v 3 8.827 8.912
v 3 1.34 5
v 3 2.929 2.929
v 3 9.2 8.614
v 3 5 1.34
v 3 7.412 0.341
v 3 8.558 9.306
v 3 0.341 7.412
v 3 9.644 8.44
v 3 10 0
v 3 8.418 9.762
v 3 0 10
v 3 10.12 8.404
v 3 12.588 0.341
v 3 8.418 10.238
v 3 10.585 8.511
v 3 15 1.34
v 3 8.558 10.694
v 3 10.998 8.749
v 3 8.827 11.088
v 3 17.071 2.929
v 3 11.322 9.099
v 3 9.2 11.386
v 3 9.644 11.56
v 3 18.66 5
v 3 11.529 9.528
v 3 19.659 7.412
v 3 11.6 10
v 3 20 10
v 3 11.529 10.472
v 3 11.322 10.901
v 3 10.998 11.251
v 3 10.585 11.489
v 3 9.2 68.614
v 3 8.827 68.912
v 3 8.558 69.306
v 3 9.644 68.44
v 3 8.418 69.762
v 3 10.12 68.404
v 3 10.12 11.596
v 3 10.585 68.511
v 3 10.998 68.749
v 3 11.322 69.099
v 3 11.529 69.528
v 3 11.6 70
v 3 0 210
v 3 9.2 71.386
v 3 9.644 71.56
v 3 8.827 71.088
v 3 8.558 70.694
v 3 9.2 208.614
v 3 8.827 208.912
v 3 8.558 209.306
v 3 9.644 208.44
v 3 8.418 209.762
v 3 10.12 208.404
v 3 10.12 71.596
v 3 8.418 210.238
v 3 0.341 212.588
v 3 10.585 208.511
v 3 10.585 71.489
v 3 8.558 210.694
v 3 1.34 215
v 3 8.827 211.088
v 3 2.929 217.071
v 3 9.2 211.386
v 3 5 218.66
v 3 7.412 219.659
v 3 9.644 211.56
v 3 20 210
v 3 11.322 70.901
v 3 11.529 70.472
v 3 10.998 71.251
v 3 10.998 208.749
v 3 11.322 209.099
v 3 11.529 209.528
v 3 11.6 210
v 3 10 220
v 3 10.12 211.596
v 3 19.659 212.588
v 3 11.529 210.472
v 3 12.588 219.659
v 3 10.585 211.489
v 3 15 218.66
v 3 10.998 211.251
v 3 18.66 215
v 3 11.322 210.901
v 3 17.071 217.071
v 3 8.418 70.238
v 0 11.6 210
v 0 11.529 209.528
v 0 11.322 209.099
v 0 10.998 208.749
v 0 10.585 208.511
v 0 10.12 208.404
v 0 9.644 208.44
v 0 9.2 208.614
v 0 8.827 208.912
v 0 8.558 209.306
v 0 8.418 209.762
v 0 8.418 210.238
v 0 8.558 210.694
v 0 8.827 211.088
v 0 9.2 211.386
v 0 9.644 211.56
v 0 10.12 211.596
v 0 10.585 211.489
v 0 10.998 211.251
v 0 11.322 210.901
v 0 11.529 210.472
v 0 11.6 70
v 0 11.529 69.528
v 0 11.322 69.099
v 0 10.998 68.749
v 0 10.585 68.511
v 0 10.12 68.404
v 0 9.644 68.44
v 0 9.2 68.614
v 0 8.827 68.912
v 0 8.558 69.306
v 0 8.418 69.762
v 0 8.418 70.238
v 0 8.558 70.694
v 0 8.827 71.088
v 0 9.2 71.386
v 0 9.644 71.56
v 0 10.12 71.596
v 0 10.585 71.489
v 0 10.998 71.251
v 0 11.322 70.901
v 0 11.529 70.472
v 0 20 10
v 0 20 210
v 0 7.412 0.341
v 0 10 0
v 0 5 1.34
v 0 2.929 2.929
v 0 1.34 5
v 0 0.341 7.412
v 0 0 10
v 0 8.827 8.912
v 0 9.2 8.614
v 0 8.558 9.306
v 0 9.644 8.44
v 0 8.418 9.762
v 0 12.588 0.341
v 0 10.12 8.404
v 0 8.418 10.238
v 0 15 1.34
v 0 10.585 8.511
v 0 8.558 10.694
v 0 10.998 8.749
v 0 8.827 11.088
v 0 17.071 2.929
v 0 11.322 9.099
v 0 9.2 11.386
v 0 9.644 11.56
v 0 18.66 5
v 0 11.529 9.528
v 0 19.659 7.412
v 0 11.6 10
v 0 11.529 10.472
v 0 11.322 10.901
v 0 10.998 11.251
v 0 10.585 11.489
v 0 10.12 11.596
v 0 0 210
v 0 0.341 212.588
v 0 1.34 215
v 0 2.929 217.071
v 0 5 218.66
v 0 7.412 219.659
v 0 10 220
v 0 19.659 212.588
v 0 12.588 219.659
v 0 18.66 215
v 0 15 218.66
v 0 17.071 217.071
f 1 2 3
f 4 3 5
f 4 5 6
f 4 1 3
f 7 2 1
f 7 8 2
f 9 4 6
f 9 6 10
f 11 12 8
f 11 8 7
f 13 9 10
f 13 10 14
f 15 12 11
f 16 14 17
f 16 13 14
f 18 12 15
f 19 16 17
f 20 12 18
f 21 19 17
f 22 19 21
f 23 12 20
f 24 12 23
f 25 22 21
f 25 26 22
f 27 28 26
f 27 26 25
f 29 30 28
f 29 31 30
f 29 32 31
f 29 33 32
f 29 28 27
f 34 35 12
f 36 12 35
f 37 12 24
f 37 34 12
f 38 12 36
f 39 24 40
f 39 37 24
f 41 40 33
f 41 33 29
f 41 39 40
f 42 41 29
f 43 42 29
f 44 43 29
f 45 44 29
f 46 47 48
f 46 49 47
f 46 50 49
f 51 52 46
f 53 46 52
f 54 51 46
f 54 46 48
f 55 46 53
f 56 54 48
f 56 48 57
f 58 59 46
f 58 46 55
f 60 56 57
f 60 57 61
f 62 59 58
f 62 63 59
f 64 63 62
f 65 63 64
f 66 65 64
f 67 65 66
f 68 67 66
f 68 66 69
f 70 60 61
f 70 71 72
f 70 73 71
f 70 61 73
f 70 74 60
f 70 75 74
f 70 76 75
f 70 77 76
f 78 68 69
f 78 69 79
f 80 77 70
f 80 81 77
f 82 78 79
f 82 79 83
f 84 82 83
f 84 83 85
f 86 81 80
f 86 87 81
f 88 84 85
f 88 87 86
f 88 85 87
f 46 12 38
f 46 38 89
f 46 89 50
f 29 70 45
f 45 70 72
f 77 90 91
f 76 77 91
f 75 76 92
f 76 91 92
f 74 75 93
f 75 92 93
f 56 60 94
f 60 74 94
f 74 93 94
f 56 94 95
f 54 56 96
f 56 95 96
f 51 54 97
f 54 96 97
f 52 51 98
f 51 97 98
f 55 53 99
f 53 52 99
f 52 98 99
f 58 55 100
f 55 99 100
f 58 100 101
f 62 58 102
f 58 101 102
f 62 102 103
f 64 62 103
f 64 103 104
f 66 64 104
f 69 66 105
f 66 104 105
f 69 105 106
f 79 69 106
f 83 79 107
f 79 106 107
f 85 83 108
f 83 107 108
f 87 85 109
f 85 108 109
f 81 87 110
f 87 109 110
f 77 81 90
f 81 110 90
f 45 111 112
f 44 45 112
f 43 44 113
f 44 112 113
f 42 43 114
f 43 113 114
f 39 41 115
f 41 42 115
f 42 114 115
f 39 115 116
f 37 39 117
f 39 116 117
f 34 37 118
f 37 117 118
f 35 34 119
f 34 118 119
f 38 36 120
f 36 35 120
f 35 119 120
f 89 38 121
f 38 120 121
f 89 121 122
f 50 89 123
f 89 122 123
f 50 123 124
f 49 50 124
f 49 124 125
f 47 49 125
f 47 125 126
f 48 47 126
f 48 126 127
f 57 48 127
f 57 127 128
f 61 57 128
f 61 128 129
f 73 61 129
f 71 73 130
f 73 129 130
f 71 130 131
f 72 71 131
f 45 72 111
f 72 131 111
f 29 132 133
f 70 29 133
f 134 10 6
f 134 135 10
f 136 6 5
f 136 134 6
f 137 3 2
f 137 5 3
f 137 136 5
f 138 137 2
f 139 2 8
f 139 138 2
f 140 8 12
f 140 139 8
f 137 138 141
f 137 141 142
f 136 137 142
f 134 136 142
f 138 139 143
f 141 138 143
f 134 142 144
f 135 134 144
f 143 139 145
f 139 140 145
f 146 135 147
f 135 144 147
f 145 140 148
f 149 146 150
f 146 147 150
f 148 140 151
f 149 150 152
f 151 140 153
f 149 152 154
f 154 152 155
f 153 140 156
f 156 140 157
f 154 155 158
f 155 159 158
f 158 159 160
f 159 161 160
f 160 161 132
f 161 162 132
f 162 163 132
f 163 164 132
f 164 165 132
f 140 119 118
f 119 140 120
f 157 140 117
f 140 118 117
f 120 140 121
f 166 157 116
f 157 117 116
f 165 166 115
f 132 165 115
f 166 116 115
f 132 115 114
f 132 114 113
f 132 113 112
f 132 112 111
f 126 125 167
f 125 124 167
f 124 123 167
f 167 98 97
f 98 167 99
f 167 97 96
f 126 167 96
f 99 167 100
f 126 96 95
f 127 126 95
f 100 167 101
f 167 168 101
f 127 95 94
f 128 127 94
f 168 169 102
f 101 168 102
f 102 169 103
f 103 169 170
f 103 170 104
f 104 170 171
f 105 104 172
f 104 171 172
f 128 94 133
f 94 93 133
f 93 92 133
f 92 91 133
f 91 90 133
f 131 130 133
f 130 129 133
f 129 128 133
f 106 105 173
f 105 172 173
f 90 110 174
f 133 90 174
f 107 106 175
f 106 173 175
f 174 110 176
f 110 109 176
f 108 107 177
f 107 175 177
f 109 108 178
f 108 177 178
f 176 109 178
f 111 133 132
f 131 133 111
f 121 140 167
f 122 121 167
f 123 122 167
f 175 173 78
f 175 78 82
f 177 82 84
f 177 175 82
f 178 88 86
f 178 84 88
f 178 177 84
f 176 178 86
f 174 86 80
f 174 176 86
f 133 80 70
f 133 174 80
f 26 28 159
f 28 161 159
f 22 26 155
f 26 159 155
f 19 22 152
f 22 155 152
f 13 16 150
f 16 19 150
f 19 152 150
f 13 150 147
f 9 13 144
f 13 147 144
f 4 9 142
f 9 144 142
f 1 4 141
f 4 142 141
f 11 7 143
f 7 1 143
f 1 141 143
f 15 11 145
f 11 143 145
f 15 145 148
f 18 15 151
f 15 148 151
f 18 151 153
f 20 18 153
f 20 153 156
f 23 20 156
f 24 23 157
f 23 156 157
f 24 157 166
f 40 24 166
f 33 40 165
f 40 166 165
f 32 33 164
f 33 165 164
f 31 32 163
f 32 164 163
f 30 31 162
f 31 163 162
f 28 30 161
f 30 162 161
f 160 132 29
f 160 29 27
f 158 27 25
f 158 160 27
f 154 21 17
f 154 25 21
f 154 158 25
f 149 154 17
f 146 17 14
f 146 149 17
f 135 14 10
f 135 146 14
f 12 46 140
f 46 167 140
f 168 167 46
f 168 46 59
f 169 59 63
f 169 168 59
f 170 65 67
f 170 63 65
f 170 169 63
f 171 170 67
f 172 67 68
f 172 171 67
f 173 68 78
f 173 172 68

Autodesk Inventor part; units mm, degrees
ref_plane "YZ Plane" through (0, 0, 0) normal (1, 0, 0) x (0, 1, 0)
ref_plane "XZ Plane" through (0, 0, 0) normal (0, 1, 0) x (-1, 0, 0)
ref_plane "XY Plane" through (0, 0, 0) normal (0, 0, 1) x (1, 0, 0)
sketch "Szkic1" plane through (0, 0, 0) normal (1, 0, 0) x (0, 1, 0)
  line L0 (10, 0) -> (10, 0)
  line L1 (20, 10) -> (20, 210)
  line L2 (10, 220) -> (10, 220)
  line L3 (0, 210) -> (0, 10)
  arc A0 (20, 210) -> (10, 220) centre (10, 210) ccw
  arc A1 (10, 220) -> (0, 210) centre (10, 210) ccw
  arc A2 (10, 0) -> (20, 10) centre (10, 10) ccw
  arc A3 (0, 10) -> (10, 0) centre (10, 10) ccw
  circle A4 centre (10, 210) radius 1.6
  circle A5 centre (10, 70) radius 1.6
  circle A6 centre (10, 10) radius 1.6
  point P0 (0, 0)
  point P1 (20, 220)
  point P2 (0, 220)
  dimension "d0" = 20
  dimension "d1" = 10
  dimension "d2" = 200
  dimension "d3" = 60
  dimension "d4" = 3.2
  dimension "d5" = 3.2
  dimension "d6" = 3.2
extrude "Wyciągnięcie proste1" add sketch "Szkic1" along normal blind 3
properties part number "segment2"
